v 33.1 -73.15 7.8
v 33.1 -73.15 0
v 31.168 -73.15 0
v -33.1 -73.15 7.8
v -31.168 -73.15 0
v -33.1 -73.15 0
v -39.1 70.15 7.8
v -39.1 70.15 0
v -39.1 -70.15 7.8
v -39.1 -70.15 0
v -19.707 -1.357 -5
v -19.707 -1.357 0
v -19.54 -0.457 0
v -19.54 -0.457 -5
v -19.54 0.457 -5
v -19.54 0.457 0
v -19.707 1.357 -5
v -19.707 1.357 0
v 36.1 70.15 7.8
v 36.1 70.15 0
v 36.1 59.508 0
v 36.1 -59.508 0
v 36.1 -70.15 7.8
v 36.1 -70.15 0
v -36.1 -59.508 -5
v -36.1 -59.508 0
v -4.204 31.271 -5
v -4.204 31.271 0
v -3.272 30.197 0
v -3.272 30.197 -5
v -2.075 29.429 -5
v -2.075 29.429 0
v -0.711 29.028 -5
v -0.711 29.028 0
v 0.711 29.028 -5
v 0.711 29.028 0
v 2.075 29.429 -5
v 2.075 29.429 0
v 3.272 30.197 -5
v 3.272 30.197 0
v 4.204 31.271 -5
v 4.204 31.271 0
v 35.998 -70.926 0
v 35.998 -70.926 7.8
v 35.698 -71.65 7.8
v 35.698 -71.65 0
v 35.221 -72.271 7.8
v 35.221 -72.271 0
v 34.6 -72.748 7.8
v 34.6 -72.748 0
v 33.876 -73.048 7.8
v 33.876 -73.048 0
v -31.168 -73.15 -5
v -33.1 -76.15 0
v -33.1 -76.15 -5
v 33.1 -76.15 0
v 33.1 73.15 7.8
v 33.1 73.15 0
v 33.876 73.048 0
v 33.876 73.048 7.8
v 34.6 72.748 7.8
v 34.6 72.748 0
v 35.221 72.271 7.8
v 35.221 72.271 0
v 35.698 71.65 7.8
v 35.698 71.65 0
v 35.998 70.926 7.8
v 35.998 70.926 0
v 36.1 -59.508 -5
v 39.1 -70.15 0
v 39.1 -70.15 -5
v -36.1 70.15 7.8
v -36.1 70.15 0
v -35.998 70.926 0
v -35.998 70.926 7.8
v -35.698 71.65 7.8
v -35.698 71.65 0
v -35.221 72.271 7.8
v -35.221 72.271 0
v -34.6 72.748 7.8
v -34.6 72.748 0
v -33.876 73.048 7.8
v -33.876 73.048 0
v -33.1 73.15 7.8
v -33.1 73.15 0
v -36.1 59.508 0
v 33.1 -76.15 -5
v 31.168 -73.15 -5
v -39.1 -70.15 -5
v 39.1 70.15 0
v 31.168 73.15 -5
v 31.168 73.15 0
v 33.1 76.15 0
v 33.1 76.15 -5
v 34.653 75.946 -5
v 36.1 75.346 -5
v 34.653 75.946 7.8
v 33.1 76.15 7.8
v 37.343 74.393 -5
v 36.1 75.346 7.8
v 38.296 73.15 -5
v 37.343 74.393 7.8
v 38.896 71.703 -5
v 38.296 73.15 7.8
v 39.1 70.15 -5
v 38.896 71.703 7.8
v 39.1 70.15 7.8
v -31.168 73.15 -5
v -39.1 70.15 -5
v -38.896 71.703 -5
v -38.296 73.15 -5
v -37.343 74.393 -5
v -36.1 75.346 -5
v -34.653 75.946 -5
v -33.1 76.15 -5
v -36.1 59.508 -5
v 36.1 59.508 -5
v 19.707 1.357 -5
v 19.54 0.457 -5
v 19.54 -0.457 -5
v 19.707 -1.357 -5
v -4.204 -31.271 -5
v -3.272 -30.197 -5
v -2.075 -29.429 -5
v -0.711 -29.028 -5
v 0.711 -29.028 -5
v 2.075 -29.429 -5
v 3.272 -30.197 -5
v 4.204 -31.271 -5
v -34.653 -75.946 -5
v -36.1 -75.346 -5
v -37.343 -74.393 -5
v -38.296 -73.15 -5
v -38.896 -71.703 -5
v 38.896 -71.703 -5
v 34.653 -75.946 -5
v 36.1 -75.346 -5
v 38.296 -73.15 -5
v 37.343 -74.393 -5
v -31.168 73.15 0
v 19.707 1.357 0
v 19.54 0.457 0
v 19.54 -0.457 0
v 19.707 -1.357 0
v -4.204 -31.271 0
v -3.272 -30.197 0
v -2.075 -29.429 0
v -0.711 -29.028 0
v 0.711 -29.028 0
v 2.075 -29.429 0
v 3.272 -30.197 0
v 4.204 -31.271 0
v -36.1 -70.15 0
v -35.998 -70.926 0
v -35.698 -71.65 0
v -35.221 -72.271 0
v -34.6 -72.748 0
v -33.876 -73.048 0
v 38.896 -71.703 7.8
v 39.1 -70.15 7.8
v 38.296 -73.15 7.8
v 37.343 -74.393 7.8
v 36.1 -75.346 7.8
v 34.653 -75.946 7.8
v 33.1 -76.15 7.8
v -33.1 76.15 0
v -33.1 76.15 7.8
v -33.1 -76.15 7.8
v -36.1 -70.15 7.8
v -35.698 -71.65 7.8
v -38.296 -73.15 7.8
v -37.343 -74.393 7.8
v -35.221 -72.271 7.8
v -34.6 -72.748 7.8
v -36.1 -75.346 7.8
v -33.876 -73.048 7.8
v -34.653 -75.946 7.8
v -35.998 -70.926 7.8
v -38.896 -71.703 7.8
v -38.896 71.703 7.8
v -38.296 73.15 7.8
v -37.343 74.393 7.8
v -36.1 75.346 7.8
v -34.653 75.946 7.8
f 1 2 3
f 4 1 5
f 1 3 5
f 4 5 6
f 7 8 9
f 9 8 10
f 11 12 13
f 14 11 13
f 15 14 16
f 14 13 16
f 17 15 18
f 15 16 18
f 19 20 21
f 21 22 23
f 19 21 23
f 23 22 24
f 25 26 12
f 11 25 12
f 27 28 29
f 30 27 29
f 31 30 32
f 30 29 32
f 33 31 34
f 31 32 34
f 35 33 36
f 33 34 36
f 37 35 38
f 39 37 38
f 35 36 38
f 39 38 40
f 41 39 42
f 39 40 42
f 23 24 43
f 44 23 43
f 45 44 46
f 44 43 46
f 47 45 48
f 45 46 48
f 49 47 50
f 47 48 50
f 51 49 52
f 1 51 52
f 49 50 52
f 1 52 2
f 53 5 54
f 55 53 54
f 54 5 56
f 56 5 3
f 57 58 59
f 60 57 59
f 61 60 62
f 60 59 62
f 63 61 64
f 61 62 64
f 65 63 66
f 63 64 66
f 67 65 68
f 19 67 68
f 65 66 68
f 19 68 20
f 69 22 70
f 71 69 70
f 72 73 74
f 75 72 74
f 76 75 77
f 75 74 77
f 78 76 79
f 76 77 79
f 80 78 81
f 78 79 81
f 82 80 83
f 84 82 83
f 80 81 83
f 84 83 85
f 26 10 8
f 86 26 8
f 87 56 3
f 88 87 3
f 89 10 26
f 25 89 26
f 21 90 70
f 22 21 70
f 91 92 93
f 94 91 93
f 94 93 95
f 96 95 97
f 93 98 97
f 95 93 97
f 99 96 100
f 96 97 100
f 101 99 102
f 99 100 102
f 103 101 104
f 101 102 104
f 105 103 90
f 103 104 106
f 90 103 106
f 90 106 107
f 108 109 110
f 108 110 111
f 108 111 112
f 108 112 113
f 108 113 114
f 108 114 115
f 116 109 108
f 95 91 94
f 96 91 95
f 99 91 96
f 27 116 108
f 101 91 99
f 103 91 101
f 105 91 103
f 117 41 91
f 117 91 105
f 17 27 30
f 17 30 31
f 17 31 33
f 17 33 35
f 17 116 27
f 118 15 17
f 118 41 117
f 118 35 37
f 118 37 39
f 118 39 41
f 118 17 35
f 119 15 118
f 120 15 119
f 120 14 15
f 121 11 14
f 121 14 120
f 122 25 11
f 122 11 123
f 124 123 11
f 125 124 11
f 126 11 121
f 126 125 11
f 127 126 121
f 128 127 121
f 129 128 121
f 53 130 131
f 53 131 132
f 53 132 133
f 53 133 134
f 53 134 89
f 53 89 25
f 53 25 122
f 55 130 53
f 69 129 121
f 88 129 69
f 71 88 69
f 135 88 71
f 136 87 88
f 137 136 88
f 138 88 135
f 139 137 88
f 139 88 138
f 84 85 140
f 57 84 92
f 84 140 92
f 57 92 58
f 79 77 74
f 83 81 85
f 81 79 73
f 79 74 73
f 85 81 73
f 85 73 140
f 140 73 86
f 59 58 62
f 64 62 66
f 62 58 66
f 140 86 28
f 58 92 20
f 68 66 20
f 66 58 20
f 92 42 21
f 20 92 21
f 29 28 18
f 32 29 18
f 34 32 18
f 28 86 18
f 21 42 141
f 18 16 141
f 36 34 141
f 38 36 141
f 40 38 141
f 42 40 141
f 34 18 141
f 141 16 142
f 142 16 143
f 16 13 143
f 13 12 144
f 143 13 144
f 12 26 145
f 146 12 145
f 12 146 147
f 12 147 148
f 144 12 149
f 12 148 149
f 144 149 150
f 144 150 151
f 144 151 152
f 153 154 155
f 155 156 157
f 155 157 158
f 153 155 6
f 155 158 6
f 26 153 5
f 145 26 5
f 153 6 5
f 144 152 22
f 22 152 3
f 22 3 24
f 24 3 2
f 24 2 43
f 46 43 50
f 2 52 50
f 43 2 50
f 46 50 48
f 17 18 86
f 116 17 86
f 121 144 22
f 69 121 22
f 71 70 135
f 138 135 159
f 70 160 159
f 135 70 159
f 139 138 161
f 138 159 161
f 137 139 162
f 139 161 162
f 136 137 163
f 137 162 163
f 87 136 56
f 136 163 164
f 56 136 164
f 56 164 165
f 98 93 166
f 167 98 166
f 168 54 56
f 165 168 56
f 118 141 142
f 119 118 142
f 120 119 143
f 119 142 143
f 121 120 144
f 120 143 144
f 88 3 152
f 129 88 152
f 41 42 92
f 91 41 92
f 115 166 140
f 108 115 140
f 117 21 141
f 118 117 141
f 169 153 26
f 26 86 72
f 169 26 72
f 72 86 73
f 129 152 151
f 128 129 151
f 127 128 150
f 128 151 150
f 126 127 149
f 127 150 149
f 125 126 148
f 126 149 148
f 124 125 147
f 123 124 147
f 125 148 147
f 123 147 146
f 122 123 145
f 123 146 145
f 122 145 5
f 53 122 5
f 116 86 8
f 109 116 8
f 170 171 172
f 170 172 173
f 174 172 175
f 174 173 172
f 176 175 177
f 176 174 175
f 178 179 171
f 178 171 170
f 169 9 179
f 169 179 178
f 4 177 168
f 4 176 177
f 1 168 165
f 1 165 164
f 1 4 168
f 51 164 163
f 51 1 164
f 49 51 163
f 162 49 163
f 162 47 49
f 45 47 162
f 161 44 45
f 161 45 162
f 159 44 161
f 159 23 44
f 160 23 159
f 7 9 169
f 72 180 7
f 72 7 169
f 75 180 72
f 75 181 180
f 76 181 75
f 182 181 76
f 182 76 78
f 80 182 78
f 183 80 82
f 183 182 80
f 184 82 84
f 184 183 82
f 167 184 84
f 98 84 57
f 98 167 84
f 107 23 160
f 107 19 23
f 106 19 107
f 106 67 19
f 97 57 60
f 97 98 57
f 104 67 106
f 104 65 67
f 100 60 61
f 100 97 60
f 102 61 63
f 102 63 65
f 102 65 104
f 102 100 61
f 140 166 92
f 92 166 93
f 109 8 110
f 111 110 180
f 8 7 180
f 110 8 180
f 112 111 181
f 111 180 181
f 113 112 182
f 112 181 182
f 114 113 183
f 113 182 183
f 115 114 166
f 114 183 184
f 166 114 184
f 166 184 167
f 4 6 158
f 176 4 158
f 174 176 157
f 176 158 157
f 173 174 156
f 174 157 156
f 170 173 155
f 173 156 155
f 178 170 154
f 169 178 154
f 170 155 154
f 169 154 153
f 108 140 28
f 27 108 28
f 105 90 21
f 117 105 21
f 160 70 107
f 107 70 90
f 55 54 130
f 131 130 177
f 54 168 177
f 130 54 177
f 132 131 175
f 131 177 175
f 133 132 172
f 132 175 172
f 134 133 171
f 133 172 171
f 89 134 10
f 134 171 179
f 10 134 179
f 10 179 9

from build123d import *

# Parameters (mm, degrees)
F1_DEPTH = 7.8
F3_DEPTH = 5


with BuildPart() as f1:
    # F0 (on Top) → F1 (new body)
    with BuildSketch(Plane.XY):
        with BuildLine():
            Line((39.1, -70.15), (39.1, 70.15))
            ThreePointArc((39.1, 70.15), (37.342641, 74.392641), (33.1, 76.15))
            Line((33.1, 76.15), (-33.1, 76.15))
            ThreePointArc((-33.1, 76.15), (-37.342641, 74.392641), (-39.1, 70.15))
            Line((-39.1, 70.15), (-39.1, -70.15))
            ThreePointArc((-39.1, -70.15), (-37.342641, -74.392641), (-33.1, -76.15))
            Line((-33.1, -76.15), (33.1, -76.15))
            ThreePointArc((33.1, -76.15), (37.342641, -74.392641), (39.1, -70.15))
        make_face()
        with BuildLine():
            Line((-33.1, 73.15), (33.1, 73.15))
            ThreePointArc((33.1, 73.15), (35.22132, 72.27132), (36.1, 70.15))
            Line((36.1, 70.15), (36.1, -70.15))
            ThreePointArc((36.1, -70.15), (35.22132, -72.27132), (33.1, -73.15))
            Line((33.1, -73.15), (-33.1, -73.15))
            ThreePointArc((-33.1, -73.15), (-35.22132, -72.27132), (-36.1, -70.15))
            Line((-36.1, -70.15), (-36.1, 70.15))
            ThreePointArc((-36.1, 70.15), (-35.22132, 72.27132), (-33.1, 73.15))
        make_face(mode=Mode.SUBTRACT)
    extrude(amount=F1_DEPTH)

    # F2 (on face) → F3 (join)
    with BuildSketch(Plane(origin=(0, 0, 0), x_dir=(1, 0, 0), z_dir=(0, 0, -1))):
        with BuildLine():
            Line((-4.203966, 31.27091), (-31.168408, 73.15))
            Line((-31.168408, 73.15), (-33.1, 73.15))
            ThreePointArc((-33.1, 73.15), (-35.22132, 72.27132), (-36.1, 70.15))
            Line((-36.1, 70.15), (-36.1, 59.508006))
            Line((-36.1, 59.508006), (-19.707009, 1.356636))
            ThreePointArc((-19.707009, 1.356636), (-19.519445, 0), (-19.707009, -1.356636))
            Line((-19.707009, -1.356636), (-36.1, -59.508006))
            Line((-36.1, -59.508006), (-36.1, -70.15))
            ThreePointArc((-36.1, -70.15), (-35.22132, -72.27132), (-33.1, -73.15))
            Line((-33.1, -73.15), (-31.168408, -73.15))
            Line((-31.168408, -73.15), (-4.203966, -31.27091))
            ThreePointArc((-4.203966, -31.27091), (0, -28.977692), (4.203966, -31.27091))
            Line((4.203966, -31.27091), (31.168408, -73.15))
            Line((31.168408, -73.15), (33.1, -73.15))
            ThreePointArc((33.1, -73.15), (35.22132, -72.27132), (36.1, -70.15))
            Line((36.1, -70.15), (36.1, -59.508006))
            Line((36.1, -59.508006), (19.707009, -1.356636))
            ThreePointArc((19.707009, -1.356636), (19.519445, 0), (19.707009, 1.356636))
            Line((19.707009, 1.356636), (36.1, 59.508006))
            Line((36.1, 59.508006), (36.1, 70.15))
            ThreePointArc((36.1, 70.15), (35.22132, 72.27132), (33.1, 73.15))
            Line((33.1, 73.15), (31.168408, 73.15))
            Line((31.168408, 73.15), (4.203966, 31.27091))
            ThreePointArc((4.203966, 31.27091), (0, 28.977692), (-4.203966, 31.27091))
        make_face()
        with BuildLine():
            Line((-31.168408, 73.15), (-33.1, 76.15))
            ThreePointArc((-33.1, 76.15), (-37.342641, 74.392641), (-39.1, 70.15))
            Line((-39.1, 70.15), (-36.1, 59.508006))
            Line((-36.1, 59.508006), (-36.1, 70.15))
            ThreePointArc((-36.1, 70.15), (-35.22132, 72.27132), (-33.1, 73.15))
            Line((-33.1, 73.15), (-31.168408, 73.15))
        make_face()
        with BuildLine():
            ThreePointArc((39.1, 70.15), (37.342641, 74.392641), (33.1, 76.15))
            Line((33.1, 76.15), (31.168408, 73.15))
            Line((31.168408, 73.15), (33.1, 73.15))
            ThreePointArc((33.1, 73.15), (35.22132, 72.27132), (36.1, 70.15))
            Line((36.1, 70.15), (36.1, 59.508006))
            Line((36.1, 59.508006), (39.1, 70.15))
        make_face()
        with BuildLine():
            ThreePointArc((33.1, -76.15), (37.342641, -74.392641), (39.1, -70.15))
            Line((39.1, -70.15), (36.1, -59.508006))
            Line((36.1, -59.508006), (36.1, -70.15))
            ThreePointArc((36.1, -70.15), (35.22132, -72.27132), (33.1, -73.15))
            Line((33.1, -73.15), (31.168408, -73.15))
            Line((31.168408, -73.15), (33.1, -76.15))
        make_face()
        with BuildLine():
            Line((-36.1, -59.508006), (-39.1, -70.15))
            ThreePointArc((-39.1, -70.15), (-37.342641, -74.392641), (-33.1, -76.15))
            Line((-33.1, -76.15), (-31.168408, -73.15))
            Line((-31.168408, -73.15), (-33.1, -73.15))
            ThreePointArc((-33.1, -73.15), (-35.22132, -72.27132), (-36.1, -70.15))
            Line((-36.1, -70.15), (-36.1, -59.508006))
        make_face()
    extrude(amount=F3_DEPTH)


solid = f1.part
